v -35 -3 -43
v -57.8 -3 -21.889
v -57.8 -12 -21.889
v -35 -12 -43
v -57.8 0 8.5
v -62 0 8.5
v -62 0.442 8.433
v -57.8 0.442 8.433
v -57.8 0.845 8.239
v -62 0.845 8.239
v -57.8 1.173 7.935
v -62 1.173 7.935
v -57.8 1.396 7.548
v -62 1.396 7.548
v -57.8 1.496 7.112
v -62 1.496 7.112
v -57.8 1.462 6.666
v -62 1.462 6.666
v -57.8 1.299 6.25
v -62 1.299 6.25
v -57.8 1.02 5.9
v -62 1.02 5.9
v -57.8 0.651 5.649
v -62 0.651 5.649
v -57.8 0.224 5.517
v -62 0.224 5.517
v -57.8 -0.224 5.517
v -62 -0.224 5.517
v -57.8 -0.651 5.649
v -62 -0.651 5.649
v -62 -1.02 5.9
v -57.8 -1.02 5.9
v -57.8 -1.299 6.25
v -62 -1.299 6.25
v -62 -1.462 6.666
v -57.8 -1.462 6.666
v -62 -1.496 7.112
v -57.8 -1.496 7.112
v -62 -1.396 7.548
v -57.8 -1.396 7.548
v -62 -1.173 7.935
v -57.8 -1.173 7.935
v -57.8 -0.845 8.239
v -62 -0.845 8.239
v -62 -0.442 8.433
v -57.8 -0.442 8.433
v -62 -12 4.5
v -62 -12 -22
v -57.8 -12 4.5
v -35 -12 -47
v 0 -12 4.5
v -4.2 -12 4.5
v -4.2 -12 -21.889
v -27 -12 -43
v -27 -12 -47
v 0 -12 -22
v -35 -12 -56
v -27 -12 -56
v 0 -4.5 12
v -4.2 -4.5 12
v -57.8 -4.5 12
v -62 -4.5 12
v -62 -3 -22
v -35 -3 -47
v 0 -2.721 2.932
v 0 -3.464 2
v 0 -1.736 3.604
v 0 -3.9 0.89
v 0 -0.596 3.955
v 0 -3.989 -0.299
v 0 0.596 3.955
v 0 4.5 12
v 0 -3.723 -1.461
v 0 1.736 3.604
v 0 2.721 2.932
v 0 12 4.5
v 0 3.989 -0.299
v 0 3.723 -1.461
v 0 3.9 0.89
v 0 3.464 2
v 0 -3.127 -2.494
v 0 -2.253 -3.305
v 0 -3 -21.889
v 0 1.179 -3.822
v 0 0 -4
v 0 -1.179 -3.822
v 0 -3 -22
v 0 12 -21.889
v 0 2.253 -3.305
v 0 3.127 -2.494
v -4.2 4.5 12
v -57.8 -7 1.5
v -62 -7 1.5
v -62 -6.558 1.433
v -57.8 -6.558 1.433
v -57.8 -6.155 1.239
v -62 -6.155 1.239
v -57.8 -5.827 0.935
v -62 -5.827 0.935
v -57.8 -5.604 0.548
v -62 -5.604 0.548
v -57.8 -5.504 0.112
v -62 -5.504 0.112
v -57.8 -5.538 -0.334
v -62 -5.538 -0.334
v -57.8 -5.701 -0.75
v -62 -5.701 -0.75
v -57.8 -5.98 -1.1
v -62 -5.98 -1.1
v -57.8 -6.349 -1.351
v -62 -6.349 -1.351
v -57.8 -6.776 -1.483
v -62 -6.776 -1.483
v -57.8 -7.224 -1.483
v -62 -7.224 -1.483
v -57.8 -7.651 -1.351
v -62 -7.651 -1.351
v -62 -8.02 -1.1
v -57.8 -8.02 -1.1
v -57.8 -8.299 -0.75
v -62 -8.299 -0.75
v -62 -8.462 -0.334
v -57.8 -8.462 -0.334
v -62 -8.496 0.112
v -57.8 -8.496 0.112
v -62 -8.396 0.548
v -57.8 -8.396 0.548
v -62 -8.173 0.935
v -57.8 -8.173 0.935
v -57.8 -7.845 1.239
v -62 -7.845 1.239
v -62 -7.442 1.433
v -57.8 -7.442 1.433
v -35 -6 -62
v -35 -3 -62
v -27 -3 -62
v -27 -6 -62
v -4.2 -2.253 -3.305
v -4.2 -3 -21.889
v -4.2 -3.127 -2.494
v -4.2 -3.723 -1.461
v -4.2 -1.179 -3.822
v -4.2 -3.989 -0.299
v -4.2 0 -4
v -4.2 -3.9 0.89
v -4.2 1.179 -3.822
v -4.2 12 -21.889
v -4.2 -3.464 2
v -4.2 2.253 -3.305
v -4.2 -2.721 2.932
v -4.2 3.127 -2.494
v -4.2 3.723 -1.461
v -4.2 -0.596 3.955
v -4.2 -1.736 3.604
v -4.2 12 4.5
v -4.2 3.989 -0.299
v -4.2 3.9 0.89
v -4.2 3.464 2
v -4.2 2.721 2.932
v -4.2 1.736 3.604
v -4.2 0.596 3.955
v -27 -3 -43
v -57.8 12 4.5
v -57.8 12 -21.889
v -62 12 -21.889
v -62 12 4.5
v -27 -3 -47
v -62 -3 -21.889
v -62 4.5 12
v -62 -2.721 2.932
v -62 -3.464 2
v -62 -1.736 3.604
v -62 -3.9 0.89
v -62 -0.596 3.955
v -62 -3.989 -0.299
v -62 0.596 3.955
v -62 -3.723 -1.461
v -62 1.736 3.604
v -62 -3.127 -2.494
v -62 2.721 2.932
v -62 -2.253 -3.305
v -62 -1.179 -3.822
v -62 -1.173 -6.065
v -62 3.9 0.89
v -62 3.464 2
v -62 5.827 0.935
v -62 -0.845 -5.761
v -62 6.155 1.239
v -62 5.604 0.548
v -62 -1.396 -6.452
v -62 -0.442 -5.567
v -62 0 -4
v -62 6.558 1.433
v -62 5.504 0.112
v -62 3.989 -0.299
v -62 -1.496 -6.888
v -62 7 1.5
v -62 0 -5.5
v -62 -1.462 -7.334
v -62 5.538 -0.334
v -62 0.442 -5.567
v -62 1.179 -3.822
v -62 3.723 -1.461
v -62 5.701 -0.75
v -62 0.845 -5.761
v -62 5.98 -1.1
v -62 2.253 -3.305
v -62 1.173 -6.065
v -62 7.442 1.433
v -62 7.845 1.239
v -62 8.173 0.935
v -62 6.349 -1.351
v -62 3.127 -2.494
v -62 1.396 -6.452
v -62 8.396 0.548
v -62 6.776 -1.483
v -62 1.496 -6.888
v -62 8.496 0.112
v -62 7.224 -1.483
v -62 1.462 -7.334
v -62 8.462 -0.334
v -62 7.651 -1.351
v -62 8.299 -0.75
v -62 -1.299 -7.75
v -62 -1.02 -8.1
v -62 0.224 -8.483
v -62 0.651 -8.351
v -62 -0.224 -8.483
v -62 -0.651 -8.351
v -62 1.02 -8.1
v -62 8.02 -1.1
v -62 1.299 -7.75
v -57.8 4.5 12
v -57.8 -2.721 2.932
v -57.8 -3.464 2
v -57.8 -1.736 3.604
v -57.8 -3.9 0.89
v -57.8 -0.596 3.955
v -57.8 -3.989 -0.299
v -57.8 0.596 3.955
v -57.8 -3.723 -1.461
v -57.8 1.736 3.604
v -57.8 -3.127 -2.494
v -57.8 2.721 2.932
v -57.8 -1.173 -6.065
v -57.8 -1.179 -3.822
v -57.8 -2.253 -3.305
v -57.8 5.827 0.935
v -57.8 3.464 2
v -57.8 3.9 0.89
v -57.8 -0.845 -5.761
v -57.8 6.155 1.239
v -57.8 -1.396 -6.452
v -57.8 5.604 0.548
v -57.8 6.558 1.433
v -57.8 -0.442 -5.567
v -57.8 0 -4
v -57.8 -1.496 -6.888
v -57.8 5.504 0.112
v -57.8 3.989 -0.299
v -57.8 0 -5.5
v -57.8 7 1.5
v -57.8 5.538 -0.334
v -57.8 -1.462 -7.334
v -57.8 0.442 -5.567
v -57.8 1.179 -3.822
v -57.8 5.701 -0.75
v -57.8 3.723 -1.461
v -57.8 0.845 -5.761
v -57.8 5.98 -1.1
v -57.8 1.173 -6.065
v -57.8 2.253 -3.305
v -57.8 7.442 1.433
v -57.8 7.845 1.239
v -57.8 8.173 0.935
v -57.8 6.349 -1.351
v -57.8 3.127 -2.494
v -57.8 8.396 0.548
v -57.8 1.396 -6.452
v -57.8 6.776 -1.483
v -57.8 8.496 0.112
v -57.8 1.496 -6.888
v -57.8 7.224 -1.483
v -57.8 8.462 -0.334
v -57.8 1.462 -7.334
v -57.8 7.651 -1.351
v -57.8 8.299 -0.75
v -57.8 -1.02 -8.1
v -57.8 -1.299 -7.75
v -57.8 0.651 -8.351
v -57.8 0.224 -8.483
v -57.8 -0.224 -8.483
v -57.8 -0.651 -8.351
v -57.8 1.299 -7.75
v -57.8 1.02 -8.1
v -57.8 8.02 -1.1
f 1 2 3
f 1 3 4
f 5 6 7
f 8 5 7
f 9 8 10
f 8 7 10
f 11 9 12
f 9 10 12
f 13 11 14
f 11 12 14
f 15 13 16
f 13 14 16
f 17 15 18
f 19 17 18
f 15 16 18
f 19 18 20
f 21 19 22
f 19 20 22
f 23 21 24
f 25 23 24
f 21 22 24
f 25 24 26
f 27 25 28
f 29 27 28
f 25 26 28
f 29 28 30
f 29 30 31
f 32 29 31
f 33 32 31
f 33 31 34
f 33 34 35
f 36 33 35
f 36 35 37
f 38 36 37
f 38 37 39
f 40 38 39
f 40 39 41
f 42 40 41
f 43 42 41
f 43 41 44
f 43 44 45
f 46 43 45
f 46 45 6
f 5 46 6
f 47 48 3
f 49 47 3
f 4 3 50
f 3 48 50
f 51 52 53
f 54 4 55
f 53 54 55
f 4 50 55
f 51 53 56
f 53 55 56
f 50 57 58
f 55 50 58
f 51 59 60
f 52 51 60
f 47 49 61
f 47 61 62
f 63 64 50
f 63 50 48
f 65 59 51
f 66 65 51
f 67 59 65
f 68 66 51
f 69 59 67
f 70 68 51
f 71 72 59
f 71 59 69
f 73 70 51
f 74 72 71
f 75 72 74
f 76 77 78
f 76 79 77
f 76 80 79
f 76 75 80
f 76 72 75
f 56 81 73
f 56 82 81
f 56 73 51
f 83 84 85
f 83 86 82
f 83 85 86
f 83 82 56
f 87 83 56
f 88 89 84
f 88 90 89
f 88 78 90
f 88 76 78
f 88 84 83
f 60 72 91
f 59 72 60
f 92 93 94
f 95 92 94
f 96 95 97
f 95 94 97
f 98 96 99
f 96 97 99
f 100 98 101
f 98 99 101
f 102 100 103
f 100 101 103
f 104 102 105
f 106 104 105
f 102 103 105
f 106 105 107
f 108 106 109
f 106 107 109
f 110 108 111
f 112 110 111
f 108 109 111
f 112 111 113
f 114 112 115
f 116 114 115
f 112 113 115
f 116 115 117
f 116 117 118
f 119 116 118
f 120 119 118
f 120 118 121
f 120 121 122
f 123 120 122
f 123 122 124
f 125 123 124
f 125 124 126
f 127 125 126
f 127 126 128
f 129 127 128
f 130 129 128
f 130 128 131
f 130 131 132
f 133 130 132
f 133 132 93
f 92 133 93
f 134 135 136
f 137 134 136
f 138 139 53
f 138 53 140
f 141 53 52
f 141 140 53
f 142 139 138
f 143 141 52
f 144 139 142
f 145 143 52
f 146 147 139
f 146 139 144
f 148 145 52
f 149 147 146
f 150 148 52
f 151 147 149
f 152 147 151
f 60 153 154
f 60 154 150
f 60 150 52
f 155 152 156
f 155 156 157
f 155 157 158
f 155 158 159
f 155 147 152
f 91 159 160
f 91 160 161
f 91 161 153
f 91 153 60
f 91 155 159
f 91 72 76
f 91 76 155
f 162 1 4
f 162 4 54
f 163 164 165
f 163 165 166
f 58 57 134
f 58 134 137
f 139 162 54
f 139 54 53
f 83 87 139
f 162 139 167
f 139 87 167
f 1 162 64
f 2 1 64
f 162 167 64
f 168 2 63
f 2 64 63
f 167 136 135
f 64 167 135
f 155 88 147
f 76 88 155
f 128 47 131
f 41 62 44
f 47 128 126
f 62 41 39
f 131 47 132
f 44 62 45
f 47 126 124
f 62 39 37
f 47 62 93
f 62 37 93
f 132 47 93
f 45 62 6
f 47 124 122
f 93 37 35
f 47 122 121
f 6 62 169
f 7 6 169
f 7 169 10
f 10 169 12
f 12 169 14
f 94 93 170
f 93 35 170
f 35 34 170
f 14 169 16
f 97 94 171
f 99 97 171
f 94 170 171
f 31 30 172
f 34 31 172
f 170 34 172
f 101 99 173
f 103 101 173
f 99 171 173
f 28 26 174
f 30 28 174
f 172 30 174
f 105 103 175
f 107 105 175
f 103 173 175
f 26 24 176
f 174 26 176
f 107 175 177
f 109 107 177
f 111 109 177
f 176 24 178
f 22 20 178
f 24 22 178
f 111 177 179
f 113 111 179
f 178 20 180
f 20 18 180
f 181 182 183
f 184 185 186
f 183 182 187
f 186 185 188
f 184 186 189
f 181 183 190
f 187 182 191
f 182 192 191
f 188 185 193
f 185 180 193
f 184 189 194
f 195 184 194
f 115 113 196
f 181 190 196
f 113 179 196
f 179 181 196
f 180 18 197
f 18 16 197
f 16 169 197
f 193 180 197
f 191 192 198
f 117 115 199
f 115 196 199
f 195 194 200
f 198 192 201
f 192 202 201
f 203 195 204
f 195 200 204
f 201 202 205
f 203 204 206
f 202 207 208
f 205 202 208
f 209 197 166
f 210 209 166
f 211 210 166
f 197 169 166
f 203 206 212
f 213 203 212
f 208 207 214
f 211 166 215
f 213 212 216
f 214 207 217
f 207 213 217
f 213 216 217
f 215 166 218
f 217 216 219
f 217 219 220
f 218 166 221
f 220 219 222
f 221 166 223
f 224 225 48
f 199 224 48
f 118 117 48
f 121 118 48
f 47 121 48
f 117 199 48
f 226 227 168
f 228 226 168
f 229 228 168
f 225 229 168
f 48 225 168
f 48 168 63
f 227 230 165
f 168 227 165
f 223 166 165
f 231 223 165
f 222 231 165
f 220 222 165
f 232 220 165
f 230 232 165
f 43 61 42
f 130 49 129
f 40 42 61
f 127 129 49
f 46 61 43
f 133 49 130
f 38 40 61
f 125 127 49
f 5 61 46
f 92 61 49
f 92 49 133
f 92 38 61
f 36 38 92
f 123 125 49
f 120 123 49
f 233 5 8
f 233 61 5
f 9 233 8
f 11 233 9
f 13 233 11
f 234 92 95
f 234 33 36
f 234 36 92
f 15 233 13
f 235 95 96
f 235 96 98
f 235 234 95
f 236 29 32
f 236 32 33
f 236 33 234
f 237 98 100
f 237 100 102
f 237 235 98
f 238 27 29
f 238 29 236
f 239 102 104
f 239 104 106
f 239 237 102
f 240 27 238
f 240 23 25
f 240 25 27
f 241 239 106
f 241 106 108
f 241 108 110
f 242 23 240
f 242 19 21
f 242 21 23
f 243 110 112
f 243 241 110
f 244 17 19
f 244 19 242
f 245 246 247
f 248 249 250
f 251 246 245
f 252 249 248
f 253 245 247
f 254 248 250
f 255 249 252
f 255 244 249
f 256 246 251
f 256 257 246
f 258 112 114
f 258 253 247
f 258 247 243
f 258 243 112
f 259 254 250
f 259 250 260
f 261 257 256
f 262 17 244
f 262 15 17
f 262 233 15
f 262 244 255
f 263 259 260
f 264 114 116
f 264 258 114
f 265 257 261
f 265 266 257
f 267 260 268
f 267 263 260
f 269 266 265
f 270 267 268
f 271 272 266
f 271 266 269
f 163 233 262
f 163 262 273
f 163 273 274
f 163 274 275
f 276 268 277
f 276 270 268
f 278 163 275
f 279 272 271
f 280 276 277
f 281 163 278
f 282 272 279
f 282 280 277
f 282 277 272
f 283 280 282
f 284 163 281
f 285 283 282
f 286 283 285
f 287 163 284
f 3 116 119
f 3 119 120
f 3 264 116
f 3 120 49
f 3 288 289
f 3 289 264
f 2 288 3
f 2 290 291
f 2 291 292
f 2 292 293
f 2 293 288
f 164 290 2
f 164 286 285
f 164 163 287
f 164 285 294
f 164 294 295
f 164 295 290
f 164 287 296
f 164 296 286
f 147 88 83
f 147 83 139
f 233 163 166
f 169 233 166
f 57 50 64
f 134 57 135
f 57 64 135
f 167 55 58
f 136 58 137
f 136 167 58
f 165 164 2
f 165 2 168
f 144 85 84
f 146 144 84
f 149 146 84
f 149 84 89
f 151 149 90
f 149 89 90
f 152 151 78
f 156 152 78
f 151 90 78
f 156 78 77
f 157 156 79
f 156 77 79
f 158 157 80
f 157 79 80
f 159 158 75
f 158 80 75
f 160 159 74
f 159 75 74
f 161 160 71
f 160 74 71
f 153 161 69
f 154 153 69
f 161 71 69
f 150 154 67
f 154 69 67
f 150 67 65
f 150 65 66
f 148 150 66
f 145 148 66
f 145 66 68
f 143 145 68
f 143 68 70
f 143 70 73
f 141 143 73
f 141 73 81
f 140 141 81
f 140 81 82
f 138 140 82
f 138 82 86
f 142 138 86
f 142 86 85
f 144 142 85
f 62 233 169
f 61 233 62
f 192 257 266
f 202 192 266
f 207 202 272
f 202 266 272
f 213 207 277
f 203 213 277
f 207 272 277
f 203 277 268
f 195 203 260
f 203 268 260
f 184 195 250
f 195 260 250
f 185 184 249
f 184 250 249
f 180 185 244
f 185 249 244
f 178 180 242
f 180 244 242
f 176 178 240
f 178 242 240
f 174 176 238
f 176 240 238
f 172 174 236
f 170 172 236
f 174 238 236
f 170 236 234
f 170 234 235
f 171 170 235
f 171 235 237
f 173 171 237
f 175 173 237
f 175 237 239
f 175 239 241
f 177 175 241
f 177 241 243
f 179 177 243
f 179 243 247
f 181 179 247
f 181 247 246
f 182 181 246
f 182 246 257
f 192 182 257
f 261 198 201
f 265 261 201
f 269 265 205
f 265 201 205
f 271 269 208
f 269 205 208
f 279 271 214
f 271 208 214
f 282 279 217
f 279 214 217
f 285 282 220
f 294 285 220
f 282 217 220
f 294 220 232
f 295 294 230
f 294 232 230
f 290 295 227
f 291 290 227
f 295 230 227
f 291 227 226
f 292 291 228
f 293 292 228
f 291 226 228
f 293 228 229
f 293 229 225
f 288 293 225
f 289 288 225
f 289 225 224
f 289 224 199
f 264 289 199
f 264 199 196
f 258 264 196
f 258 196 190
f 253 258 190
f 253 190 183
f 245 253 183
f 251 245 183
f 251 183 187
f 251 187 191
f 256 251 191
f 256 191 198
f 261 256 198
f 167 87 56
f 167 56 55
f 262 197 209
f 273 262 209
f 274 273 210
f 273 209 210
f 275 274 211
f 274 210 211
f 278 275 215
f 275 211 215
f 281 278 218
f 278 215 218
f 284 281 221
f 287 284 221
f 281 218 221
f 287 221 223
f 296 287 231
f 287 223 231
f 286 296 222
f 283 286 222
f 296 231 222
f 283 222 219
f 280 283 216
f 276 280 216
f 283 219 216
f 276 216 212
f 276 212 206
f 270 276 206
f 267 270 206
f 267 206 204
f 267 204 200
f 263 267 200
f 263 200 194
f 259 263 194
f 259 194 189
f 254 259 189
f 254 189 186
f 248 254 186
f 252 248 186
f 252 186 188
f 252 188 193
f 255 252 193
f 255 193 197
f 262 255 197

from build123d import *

# Parameters (mm, degrees)
BOSS_EXTRUDE1_DEPTH = 62
CUT_EXTRUDE1_REACH  = 83.419
BOSS_EXTRUDE2_START = -15
SKETCH9_W           = 8
SKETCH9_H           = 15
BOSS_EXTRUDE2_DEPTH = 9
SKETCH7_R           = 4
CUT_EXTRUDE4_DEPTH  = 70
CUT_EXTRUDE5_REACH  = 90.499
SKETCH8_R           = 1.5
CHAMFER1_SIZE       = 7.5
CUT_EXTRUDE6_DEPTH  = 15
CHAMFER2_SIZE       = 6


with BuildPart() as part:
    # Sketch1 → Boss-Extrude1 (new body)
    with BuildSketch(Plane(origin=(0, 0, 0), x_dir=(0, 0, -1), z_dir=(1, 0, 0))):
        Polygon((-12, 12), (-12, -12), (12, -12), (47, -12), (47, 12), (12, 12), align=None)
    extrude(amount=-BOSS_EXTRUDE1_DEPTH)

    # Sketch2 → Cut-Extrude1 (cut, up to next)
    with BuildSketch(Plane(origin=(0, 12, 0), x_dir=(1, 0, 0), z_dir=(0, 1, 0)), mode=Mode.PRIVATE) as cut_extrude1_sk1:
        Polygon((-57.8, -12), (-57.8, 21.888888889), (-35, 43), (-27, 43), (-4.2, 21.888888889), (-4.2, -12), align=None)
    cut_extrude1_tool1 = extrude(cut_extrude1_sk1.sketch, amount=-CUT_EXTRUDE1_REACH, mode=Mode.PRIVATE) & part.part
    # Sketch2 → Cut-Extrude1 (cut, up to next)
    with BuildSketch(Plane(origin=(0, 12, 0), x_dir=(1, 0, 0), z_dir=(0, 1, 0)), mode=Mode.PRIVATE) as cut_extrude1_sk2:
        Polygon((-62, 22), (-62, 47), (-35, 47), align=None)
    cut_extrude1_tool2 = extrude(cut_extrude1_sk2.sketch, amount=-CUT_EXTRUDE1_REACH, mode=Mode.PRIVATE) & part.part
    # Sketch2 → Cut-Extrude1 (cut, up to next)
    with BuildSketch(Plane(origin=(0, 12, 0), x_dir=(1, 0, 0), z_dir=(0, 1, 0)), mode=Mode.PRIVATE) as cut_extrude1_sk3:
        Polygon((-27, 47), (0, 47), (0, 22), align=None)
    cut_extrude1_tool3 = extrude(cut_extrude1_sk3.sketch, amount=-CUT_EXTRUDE1_REACH, mode=Mode.PRIVATE) & part.part
    add(cut_extrude1_tool1.solids().sort_by_distance((-31, 12, -11.506957))[0], mode=Mode.SUBTRACT)
    add(cut_extrude1_tool2.solids().sort_by_distance((-53, 12, -38.666667))[0], mode=Mode.SUBTRACT)
    add(cut_extrude1_tool3.solids().sort_by_distance((-9, 12, -38.666667))[0], mode=Mode.SUBTRACT)

    # Sketch9 → Boss-Extrude2 (add)
    with BuildSketch(Plane(origin=(0, 12, 0), x_dir=(1, 0, 0), z_dir=(0, 1, 0)).offset(BOSS_EXTRUDE2_START)):
        with Locations((-31, 54.5)):
            Rectangle(SKETCH9_W, SKETCH9_H)
    extrude(amount=-BOSS_EXTRUDE2_DEPTH)

    # Sketch7 → Cut-Extrude4 (cut)
    with BuildSketch(Plane(origin=(0, 0, 0), x_dir=(0, 0, -1), z_dir=(1, 0, 0))):
        Circle(SKETCH7_R)
    extrude(amount=-CUT_EXTRUDE4_DEPTH, mode=Mode.SUBTRACT)

    # Sketch8 → Cut-Extrude5 (cut, up to next)
    with BuildSketch(Plane.ZY.offset(62), mode=Mode.PRIVATE) as cut_extrude5_sk1:
        with Locations((0, 7)):
            Circle(SKETCH8_R)
    cut_extrude5_tool1 = extrude(cut_extrude5_sk1.sketch, amount=-CUT_EXTRUDE5_REACH, mode=Mode.PRIVATE) & part.part
    # Sketch8 → Cut-Extrude5 (cut, up to next)
    with BuildSketch(Plane.ZY.offset(62), mode=Mode.PRIVATE) as cut_extrude5_sk2:
        with Locations((7, 0)):
            Circle(SKETCH8_R)
    cut_extrude5_tool2 = extrude(cut_extrude5_sk2.sketch, amount=-CUT_EXTRUDE5_REACH, mode=Mode.PRIVATE) & part.part
    # Sketch8 → Cut-Extrude5 (cut, up to next)
    with BuildSketch(Plane.ZY.offset(62), mode=Mode.PRIVATE) as cut_extrude5_sk3:
        with Locations((0, -7)):
            Circle(SKETCH8_R)
    cut_extrude5_tool3 = extrude(cut_extrude5_sk3.sketch, amount=-CUT_EXTRUDE5_REACH, mode=Mode.PRIVATE) & part.part
    # Sketch8 → Cut-Extrude5 (cut, up to next)
    with BuildSketch(Plane.ZY.offset(62), mode=Mode.PRIVATE) as cut_extrude5_sk4:
        with Locations((-7, 0)):
            Circle(SKETCH8_R)
    cut_extrude5_tool4 = extrude(cut_extrude5_sk4.sketch, amount=-CUT_EXTRUDE5_REACH, mode=Mode.PRIVATE) & part.part
    add(cut_extrude5_tool1.solids().sort_by_distance((-62, 7, 0))[0], mode=Mode.SUBTRACT)
    add(cut_extrude5_tool2.solids().sort_by_distance((-62, 0, 7))[0], mode=Mode.SUBTRACT)
    add(cut_extrude5_tool3.solids().sort_by_distance((-62, -7, 0))[0], mode=Mode.SUBTRACT)
    add(cut_extrude5_tool4.solids().sort_by_distance((-62, 0, -7))[0], mode=Mode.SUBTRACT)

    # Chamfer1
    chamfer1_edges = [part.edges().sort_by_distance(p)[0] for p in [
        (-59.9, -12, 12),
        (-59.9, 12, 12),
        (-2.1, 12, 12),
        (-2.1, -12, 12),
    ]]
    chamfer(chamfer1_edges, length=CHAMFER1_SIZE)

    # Sketch10 → Cut-Extrude6 (cut)
    with BuildSketch(Plane(origin=(0, 12, 0), x_dir=(1, 0, 0), z_dir=(0, 1, 0))):
        Polygon((-62, 22), (-35, 47), (-27, 47), (0, 22), (0, 21.888888889), (-4.2, 21.888888889), (-27, 43), (-35, 43), (-57.8, 21.888888889), (-62, 21.888888889), align=None)
    extrude(amount=-CUT_EXTRUDE6_DEPTH, mode=Mode.SUBTRACT)

    # Chamfer2
    chamfer2_edges = [part.edges().sort_by_distance(p)[0] for p in [
        (-31, -12, -62),
    ]]
    chamfer(chamfer2_edges, length=CHAMFER2_SIZE)


solid = part.part
